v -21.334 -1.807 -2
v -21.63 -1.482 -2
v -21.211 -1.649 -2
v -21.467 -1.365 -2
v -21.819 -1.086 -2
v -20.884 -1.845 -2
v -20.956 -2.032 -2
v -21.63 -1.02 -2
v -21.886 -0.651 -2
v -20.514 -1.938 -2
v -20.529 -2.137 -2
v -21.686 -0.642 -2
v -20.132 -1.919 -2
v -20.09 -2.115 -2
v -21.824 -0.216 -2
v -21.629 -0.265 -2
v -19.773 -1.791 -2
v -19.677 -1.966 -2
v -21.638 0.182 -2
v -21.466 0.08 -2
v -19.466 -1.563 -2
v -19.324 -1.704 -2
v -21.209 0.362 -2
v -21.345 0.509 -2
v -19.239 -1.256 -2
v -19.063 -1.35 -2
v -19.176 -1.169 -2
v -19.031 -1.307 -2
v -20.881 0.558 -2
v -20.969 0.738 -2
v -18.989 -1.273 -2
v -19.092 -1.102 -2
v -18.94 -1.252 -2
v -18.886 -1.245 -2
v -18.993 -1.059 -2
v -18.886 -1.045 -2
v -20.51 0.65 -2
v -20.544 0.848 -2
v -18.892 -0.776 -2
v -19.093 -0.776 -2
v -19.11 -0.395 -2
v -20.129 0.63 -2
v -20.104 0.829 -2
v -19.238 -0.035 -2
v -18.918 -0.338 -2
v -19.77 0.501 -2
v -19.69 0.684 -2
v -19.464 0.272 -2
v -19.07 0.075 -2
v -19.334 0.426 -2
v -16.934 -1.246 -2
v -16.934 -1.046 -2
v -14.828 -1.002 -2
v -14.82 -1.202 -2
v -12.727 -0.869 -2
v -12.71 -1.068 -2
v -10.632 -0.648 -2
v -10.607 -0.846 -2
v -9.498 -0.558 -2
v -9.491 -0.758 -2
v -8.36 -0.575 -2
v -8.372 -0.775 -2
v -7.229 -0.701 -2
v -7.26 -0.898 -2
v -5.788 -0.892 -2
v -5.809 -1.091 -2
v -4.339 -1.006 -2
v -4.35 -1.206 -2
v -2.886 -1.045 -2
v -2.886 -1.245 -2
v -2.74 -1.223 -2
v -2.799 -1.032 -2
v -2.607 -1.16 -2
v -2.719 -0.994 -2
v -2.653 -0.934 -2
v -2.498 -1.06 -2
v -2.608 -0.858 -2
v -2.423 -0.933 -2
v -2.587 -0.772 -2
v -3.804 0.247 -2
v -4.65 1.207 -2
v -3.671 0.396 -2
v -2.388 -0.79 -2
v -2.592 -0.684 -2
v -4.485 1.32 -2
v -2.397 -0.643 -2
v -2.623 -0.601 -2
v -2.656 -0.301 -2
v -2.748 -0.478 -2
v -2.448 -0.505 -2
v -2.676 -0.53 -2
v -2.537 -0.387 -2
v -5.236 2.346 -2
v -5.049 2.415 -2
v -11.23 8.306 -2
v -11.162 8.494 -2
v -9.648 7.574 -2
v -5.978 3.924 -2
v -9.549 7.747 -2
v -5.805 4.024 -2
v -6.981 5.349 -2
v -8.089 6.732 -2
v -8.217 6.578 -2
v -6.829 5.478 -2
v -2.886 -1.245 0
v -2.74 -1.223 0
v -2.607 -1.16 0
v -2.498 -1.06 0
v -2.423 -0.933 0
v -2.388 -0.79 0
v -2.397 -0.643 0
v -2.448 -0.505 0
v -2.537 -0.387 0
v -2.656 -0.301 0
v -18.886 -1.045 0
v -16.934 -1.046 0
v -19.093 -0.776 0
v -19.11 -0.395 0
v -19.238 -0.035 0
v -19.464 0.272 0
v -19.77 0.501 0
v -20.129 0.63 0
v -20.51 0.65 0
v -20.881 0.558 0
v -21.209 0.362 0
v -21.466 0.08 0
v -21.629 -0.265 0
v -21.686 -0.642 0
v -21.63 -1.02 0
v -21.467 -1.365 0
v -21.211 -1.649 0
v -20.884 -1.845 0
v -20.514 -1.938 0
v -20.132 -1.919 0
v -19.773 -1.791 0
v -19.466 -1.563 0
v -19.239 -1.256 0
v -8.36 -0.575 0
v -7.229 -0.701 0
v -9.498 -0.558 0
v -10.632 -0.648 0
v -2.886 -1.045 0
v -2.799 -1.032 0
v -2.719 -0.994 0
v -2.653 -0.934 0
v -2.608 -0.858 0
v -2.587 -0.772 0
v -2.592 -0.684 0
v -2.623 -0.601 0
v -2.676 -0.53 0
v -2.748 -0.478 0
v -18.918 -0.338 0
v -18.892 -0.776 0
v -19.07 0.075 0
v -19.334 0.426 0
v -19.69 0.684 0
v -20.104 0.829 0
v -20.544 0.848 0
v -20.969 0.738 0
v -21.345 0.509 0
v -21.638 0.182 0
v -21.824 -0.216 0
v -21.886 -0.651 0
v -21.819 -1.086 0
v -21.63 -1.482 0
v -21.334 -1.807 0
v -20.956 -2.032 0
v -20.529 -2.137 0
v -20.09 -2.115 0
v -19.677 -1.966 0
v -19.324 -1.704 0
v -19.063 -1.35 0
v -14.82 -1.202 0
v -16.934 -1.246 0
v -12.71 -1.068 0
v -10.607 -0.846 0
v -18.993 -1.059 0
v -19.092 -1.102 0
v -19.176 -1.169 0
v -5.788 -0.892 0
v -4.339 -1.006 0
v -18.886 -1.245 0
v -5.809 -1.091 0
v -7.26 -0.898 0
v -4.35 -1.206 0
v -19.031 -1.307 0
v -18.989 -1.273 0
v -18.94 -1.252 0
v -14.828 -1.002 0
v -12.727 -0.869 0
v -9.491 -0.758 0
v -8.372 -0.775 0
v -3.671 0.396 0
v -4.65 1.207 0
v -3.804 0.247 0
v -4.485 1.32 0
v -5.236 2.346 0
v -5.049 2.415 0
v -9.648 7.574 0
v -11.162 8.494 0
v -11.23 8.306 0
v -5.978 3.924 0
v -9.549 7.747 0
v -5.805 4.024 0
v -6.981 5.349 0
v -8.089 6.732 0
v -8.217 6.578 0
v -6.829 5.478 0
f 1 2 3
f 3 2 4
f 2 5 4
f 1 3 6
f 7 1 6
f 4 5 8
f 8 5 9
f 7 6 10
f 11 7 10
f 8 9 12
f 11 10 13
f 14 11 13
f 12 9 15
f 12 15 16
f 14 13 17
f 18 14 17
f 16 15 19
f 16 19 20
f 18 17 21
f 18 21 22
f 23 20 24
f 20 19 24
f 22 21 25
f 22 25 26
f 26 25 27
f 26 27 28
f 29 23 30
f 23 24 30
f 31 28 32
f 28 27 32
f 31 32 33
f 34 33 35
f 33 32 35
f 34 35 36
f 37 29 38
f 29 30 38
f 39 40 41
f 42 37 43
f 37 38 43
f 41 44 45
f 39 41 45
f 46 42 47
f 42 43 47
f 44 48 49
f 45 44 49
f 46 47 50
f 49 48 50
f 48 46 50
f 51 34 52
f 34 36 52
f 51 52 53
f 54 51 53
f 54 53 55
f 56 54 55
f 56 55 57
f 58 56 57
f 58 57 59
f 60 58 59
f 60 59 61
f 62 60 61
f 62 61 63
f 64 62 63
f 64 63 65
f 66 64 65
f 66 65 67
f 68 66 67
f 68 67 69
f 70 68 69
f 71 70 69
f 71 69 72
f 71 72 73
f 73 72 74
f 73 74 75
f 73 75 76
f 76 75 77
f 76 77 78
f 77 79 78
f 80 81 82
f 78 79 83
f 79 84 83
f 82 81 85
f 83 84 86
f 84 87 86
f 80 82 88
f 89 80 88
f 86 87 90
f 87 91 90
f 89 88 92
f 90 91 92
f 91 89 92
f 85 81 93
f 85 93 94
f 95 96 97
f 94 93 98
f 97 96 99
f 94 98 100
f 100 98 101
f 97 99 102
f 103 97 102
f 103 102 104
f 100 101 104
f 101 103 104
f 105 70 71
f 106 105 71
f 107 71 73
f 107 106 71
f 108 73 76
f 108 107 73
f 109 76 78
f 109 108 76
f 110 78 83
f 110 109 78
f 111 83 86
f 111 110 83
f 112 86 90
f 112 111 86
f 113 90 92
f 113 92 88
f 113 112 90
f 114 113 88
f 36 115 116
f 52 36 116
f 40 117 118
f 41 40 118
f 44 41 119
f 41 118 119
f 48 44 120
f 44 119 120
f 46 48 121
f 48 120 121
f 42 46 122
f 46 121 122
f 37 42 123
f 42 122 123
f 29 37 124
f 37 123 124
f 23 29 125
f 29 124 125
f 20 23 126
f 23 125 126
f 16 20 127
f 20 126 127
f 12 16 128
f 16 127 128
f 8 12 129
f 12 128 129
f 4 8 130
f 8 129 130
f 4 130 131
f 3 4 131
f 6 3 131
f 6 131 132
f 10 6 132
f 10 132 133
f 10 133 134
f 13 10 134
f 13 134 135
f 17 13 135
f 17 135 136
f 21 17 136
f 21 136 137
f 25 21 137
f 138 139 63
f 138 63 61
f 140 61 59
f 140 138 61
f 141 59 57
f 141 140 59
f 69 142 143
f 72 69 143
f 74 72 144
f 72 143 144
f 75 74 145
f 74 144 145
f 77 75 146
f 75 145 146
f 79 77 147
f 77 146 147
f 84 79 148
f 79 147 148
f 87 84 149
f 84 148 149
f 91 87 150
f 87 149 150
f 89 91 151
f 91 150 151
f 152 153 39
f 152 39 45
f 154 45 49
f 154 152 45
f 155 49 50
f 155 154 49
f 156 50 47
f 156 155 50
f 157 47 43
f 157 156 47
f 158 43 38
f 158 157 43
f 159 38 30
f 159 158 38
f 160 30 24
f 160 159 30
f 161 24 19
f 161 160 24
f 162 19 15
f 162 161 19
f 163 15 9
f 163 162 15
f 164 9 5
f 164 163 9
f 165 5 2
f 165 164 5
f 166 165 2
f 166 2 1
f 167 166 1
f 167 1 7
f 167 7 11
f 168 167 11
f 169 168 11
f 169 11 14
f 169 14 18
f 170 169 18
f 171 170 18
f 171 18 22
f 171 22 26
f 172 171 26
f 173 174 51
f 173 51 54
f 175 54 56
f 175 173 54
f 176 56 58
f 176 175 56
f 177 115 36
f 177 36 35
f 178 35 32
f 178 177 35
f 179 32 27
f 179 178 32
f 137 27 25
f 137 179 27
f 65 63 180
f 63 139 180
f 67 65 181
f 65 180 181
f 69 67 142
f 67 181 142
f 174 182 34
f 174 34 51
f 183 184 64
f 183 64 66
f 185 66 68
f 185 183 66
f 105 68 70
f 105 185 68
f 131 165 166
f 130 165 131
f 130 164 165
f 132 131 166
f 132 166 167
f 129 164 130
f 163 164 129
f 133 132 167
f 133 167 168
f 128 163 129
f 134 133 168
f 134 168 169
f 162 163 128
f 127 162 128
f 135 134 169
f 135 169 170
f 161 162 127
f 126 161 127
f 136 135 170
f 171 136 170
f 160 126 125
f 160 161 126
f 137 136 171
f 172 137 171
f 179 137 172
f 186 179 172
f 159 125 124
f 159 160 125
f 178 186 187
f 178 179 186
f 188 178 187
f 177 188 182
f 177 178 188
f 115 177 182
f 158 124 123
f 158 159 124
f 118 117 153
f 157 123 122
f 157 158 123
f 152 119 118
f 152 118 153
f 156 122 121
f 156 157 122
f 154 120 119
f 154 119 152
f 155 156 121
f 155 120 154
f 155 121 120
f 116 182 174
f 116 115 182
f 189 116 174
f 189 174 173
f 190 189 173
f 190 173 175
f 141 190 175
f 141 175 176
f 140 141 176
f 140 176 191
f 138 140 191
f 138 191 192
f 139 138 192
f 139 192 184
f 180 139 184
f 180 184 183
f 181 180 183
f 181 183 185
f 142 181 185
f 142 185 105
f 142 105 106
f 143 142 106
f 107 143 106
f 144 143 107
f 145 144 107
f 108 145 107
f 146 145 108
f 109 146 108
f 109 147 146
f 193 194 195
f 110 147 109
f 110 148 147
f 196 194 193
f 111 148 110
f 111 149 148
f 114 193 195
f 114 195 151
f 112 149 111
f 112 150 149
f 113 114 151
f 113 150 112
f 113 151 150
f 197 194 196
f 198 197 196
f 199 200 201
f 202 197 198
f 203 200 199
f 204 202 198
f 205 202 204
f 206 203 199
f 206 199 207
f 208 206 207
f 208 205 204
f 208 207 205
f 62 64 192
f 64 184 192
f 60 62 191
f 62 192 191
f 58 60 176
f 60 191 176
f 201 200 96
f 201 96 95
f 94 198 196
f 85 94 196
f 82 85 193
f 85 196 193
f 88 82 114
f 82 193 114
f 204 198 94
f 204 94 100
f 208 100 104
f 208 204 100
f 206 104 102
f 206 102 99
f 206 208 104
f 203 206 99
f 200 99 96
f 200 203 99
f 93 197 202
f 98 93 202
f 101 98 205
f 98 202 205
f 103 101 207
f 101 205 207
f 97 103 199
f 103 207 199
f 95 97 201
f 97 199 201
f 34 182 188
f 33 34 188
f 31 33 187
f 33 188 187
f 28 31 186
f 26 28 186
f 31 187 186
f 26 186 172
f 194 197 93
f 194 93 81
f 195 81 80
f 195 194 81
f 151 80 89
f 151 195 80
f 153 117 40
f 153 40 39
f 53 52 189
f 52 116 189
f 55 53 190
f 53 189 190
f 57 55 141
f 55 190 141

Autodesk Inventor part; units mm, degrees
ref_plane "YZ Plane" through (0, 0, 0) normal (1, 0, 0) x (0, 1, 0)
ref_plane "XZ Plane" through (0, 0, 0) normal (0, 1, 0) x (-1, 0, 0)
ref_plane "XY Plane" through (0, 0, 0) normal (0, 0, 1) x (1, 0, 0)
sketch "Sketch1" plane through (0, 0, 0) normal (0, 0, 1) x (1, 0, 0)
  arc A0 (-2.8862, -1.2447) -> (-2.6561, -0.3007) centre (-2.8862, -0.7447) ccw
  arc A1 (-7.2602, -0.8985) -> (-2.8862, -1.2447) centre (-2.8862, 26.566) ccw
  arc A2 (-5.0488, 2.4151) -> (-2.6561, -0.3007) centre (-0.3551, 4.1384) ccw
  arc A3 (-5.0488, 2.4151) -> (-11.1621, 8.4942) centre (-14.6238, -1.1004) ccw
  arc A4 (-16.9335, -1.2455) -> (-10.6071, -0.846) centre (-16.9124, 48.7131) ccw
  arc A5 (-7.2602, -0.8985) -> (-10.6071, -0.846) centre (-9.1171, -12.5575) ccw
  arc A6 (-16.9335, -1.0455) -> (-10.6324, -0.6476) centre (-16.9124, 48.7131) ccw
  arc A7 (-7.2288, -0.701) -> (-10.6324, -0.6476) centre (-9.1171, -12.5575) ccw
  arc A8 (-7.2288, -0.701) -> (-2.8862, -1.0447) centre (-2.8862, 26.566) ccw
  arc A9 (-2.8862, -1.0447) -> (-2.7481, -0.4783) centre (-2.8862, -0.7447) ccw
  arc A10 (-5.2365, 2.3461) -> (-2.7481, -0.4783) centre (-0.3551, 4.1384) ccw
  arc A11 (-5.2365, 2.3461) -> (-11.23, 8.3061) centre (-14.6238, -1.1004) ccw
  line L0 (-11.1621, 8.4942) -> (-11.23, 8.3061)
  line L1 (-5.2365, 2.3461) -> (-5.0488, 2.4151) construction
  line L2 (-2.7481, -0.4783) -> (-2.6561, -0.3007) construction
  line L3 (-5.0488, 2.4151) -> (-0.3551, 4.1384) construction
  line L4 (-0.3551, 4.1384) -> (-2.6561, -0.3007) construction
  line L5 (-11.23, 8.3061) -> (-14.6238, -1.1004) construction
  arc A12 (-18.8918, -0.7763) -> (-19.0627, -1.3505) centre (-20.3859, -0.644) ccw projected
  arc A13 (-18.8862, -1.2447) -> (-19.0627, -1.3505) centre (-18.8862, -1.4447) ccw projected
  arc A14 (-19.0927, -0.7763) -> (-19.2391, -1.2563) centre (-20.3859, -0.644) ccw
  arc A15 (-18.8861, -1.0447) -> (-19.2391, -1.2563) centre (-18.8862, -1.4447) ccw
  line L6 (-18.8862, -1.2447) -> (-16.9335, -1.2455)
  line L7 (-18.8861, -1.0447) -> (-16.9335, -1.0455)
  line L8 (-18.8862, -1.2447) -> (-2.8862, -1.2447) construction
  line L9 (-19.0927, -0.7763) -> (-18.8918, -0.7763)
  point P0 (-18.8374, -1.1048)
  dimension "d25" = 50
  dimension "d26" = 42.44
  dimension "d27" = 10
  dimension "d28" = 5
  dimension "d34" = 0.5
  dimension "d35" = 1.3
  dimension "d36" = 16
extrude "Extrusion2" add sketch "Sketch1" against normal blind 2
properties part number "scissor_spring"
